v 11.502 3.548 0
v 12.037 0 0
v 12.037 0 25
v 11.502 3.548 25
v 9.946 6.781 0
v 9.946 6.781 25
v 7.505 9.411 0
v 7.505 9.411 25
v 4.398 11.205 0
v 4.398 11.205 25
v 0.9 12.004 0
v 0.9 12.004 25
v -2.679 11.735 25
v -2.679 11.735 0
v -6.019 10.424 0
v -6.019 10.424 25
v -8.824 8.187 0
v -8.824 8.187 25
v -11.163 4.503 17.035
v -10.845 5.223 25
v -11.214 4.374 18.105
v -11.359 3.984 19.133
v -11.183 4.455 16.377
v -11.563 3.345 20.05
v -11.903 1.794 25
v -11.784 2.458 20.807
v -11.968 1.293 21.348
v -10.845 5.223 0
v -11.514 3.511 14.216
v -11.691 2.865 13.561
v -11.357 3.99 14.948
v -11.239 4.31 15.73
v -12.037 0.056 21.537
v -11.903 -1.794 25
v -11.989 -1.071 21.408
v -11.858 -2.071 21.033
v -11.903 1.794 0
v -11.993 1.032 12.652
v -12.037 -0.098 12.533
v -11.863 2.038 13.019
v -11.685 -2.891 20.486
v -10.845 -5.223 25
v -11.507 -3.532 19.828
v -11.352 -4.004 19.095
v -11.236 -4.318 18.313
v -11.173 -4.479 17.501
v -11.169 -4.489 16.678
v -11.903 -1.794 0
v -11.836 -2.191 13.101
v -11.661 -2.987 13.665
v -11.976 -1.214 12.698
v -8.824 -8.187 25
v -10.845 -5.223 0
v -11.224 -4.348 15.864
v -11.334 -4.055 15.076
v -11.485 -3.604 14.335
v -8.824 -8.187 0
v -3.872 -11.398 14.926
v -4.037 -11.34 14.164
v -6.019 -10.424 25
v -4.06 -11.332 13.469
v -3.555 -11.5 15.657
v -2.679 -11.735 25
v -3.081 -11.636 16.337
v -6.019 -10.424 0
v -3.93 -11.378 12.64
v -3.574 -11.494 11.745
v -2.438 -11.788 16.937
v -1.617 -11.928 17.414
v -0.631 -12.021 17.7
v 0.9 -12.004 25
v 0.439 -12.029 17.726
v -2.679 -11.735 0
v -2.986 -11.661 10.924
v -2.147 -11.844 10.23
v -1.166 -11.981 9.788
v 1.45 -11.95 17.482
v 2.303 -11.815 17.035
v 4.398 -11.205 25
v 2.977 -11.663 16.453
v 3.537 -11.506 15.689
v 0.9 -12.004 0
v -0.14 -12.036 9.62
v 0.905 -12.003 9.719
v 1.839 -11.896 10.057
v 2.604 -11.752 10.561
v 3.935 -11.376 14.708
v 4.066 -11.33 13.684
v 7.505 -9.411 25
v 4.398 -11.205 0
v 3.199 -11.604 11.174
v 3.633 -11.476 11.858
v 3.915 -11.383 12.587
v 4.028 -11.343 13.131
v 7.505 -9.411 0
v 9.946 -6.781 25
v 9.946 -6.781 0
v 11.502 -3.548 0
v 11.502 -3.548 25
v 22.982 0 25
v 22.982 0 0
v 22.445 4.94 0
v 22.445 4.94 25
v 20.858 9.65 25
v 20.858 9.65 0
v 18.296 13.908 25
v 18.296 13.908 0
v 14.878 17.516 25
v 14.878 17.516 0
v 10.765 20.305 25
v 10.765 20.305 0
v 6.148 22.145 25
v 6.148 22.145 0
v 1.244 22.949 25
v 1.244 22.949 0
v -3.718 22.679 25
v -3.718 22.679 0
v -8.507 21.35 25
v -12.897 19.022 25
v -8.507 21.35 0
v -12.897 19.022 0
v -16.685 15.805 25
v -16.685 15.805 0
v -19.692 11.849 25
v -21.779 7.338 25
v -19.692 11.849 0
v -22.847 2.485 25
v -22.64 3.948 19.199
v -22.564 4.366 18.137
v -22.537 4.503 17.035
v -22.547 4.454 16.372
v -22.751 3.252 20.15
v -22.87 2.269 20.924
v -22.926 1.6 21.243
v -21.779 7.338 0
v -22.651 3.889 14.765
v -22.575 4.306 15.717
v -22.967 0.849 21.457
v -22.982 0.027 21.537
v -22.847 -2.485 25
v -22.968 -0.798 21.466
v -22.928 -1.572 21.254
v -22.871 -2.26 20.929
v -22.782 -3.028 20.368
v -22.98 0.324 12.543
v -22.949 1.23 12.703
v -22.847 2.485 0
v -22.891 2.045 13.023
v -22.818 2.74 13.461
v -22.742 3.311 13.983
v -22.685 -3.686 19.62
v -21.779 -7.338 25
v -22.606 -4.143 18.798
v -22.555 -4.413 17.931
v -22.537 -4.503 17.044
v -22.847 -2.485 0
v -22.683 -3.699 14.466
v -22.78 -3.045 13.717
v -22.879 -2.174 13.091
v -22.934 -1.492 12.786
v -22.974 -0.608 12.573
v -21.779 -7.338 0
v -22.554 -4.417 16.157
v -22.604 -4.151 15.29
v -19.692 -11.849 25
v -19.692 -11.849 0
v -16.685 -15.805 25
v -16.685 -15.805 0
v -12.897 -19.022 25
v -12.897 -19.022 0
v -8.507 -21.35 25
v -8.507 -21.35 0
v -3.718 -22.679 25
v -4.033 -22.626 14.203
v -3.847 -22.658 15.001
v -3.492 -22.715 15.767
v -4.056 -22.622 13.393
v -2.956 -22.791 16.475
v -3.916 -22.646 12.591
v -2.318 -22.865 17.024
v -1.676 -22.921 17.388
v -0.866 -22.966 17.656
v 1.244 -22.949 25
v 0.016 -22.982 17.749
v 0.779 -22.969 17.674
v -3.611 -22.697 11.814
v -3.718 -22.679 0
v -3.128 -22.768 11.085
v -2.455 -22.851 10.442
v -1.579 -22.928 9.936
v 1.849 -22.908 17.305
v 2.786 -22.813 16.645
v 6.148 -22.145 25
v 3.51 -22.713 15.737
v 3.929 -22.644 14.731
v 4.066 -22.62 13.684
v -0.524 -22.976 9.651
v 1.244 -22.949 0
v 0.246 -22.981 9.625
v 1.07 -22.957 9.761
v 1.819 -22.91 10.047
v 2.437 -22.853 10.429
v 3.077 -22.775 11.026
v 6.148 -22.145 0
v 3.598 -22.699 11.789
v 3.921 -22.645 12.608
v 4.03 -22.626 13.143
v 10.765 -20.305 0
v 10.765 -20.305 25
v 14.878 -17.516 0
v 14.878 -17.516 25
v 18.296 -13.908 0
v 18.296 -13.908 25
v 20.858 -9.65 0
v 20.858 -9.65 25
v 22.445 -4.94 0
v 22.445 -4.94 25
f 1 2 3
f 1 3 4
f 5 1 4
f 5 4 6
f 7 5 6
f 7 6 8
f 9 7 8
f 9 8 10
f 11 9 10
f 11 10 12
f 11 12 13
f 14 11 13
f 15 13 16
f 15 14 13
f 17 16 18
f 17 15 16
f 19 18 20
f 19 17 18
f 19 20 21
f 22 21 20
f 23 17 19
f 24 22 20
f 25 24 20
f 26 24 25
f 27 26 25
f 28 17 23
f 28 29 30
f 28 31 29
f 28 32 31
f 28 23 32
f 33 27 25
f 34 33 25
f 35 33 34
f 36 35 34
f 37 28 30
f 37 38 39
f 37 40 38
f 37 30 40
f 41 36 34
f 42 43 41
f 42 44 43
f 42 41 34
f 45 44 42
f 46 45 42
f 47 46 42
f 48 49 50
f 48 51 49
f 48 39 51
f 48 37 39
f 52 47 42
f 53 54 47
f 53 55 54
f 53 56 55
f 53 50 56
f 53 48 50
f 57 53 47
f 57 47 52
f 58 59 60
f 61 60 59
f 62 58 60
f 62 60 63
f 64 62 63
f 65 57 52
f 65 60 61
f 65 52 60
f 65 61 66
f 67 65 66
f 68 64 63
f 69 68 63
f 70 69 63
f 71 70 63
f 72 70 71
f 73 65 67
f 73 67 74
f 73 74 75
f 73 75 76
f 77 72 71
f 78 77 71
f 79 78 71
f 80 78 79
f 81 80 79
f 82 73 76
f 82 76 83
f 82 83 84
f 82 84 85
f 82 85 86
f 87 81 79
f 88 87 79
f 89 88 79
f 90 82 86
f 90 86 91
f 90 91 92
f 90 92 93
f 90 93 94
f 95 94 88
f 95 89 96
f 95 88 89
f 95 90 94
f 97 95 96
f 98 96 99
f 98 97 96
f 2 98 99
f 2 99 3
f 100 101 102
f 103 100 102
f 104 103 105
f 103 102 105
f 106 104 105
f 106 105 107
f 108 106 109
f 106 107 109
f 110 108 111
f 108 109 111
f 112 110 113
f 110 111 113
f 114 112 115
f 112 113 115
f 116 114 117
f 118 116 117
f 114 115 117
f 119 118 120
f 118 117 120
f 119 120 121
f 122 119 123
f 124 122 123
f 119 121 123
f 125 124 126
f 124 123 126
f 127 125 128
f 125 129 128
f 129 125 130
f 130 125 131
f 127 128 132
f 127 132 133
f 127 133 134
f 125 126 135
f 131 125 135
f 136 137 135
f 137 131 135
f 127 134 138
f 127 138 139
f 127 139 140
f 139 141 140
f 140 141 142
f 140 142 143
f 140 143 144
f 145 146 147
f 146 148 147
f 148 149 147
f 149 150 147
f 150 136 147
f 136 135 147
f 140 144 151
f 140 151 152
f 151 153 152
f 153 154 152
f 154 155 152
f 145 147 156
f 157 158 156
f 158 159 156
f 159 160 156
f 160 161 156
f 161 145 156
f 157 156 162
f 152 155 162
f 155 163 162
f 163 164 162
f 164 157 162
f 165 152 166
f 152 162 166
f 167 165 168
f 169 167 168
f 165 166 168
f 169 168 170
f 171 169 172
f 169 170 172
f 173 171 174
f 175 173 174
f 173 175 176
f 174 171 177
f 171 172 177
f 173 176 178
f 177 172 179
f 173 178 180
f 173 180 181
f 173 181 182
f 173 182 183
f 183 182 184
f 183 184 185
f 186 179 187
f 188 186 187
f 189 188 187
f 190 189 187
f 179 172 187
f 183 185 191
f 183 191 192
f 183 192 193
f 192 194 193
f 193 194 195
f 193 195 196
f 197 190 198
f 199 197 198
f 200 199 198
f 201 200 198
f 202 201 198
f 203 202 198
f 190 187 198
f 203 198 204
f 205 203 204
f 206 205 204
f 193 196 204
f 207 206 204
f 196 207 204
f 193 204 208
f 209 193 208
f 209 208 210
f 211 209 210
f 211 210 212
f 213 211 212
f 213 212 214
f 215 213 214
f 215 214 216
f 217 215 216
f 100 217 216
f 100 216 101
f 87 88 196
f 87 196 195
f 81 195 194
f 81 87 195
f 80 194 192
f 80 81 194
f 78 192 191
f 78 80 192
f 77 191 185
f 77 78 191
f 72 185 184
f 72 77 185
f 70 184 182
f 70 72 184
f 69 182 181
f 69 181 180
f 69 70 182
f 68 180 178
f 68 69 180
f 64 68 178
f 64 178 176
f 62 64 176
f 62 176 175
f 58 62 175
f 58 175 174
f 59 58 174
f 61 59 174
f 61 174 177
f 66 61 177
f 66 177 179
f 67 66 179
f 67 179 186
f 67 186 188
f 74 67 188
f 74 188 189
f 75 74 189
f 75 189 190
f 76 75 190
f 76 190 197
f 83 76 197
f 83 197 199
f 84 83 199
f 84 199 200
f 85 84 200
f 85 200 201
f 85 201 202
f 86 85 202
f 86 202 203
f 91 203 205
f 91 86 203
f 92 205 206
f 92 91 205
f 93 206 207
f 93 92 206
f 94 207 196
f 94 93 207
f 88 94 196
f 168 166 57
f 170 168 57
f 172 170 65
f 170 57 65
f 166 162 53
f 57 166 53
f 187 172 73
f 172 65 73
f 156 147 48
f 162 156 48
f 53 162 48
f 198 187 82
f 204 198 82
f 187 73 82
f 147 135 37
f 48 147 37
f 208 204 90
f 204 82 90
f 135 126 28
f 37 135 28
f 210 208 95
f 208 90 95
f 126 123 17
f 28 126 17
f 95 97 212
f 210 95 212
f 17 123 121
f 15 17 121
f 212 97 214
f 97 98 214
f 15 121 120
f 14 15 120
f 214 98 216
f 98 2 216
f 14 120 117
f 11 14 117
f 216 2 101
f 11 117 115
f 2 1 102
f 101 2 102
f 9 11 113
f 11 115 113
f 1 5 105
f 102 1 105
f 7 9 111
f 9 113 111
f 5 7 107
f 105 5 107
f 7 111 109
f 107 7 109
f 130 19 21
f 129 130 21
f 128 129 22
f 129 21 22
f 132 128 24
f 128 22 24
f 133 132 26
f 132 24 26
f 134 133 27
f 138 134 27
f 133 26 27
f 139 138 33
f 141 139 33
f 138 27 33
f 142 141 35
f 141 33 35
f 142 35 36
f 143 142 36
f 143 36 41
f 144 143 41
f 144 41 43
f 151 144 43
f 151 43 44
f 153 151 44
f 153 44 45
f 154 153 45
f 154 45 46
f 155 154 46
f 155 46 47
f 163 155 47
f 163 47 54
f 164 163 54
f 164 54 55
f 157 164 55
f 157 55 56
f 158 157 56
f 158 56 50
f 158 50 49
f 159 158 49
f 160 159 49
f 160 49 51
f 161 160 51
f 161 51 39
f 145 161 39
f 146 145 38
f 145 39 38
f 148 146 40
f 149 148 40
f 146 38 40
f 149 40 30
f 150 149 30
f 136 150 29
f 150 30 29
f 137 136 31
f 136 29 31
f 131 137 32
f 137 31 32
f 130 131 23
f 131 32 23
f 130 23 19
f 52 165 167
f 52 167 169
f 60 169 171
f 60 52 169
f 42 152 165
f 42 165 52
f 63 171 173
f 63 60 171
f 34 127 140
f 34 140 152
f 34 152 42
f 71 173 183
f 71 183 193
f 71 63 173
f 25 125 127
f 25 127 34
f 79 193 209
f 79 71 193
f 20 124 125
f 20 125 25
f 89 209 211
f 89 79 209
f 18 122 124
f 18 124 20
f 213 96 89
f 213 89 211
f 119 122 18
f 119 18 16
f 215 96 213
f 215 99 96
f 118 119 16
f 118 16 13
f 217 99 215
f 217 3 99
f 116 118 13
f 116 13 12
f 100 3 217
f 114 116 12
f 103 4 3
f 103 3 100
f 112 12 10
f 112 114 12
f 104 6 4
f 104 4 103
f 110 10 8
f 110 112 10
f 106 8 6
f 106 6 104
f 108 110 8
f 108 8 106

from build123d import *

# Parameters (mm, degrees)
F0_R     = 22.982221
F0_R_2   = 12.037169
F1_DEPTH = 25
F2_R     = 4.502858
F3_DEPTH = 22.983221
F4_R     = 4.066018
F5_DEPTH = 22.983221


with BuildPart() as f1:
    # F0 (on Top) → F1 (new body)
    with BuildSketch(Plane.XY):
        Circle(F0_R)
        Circle(F0_R_2, mode=Mode.SUBTRACT)
    extrude(amount=F1_DEPTH)

    # F2 (on Right) → F3 (cut, through all)
    with BuildSketch(Plane.YZ):
        with Locations((0, 17.034575)):
            Circle(F2_R)
    extrude(amount=-F3_DEPTH, mode=Mode.SUBTRACT)

    # F4 (on Front) → F5 (cut, through all)
    with BuildSketch(Plane.XZ):
        with Locations((0, 13.683511)):
            Circle(F4_R)
    extrude(amount=F5_DEPTH, mode=Mode.SUBTRACT)


solid = f1.part
